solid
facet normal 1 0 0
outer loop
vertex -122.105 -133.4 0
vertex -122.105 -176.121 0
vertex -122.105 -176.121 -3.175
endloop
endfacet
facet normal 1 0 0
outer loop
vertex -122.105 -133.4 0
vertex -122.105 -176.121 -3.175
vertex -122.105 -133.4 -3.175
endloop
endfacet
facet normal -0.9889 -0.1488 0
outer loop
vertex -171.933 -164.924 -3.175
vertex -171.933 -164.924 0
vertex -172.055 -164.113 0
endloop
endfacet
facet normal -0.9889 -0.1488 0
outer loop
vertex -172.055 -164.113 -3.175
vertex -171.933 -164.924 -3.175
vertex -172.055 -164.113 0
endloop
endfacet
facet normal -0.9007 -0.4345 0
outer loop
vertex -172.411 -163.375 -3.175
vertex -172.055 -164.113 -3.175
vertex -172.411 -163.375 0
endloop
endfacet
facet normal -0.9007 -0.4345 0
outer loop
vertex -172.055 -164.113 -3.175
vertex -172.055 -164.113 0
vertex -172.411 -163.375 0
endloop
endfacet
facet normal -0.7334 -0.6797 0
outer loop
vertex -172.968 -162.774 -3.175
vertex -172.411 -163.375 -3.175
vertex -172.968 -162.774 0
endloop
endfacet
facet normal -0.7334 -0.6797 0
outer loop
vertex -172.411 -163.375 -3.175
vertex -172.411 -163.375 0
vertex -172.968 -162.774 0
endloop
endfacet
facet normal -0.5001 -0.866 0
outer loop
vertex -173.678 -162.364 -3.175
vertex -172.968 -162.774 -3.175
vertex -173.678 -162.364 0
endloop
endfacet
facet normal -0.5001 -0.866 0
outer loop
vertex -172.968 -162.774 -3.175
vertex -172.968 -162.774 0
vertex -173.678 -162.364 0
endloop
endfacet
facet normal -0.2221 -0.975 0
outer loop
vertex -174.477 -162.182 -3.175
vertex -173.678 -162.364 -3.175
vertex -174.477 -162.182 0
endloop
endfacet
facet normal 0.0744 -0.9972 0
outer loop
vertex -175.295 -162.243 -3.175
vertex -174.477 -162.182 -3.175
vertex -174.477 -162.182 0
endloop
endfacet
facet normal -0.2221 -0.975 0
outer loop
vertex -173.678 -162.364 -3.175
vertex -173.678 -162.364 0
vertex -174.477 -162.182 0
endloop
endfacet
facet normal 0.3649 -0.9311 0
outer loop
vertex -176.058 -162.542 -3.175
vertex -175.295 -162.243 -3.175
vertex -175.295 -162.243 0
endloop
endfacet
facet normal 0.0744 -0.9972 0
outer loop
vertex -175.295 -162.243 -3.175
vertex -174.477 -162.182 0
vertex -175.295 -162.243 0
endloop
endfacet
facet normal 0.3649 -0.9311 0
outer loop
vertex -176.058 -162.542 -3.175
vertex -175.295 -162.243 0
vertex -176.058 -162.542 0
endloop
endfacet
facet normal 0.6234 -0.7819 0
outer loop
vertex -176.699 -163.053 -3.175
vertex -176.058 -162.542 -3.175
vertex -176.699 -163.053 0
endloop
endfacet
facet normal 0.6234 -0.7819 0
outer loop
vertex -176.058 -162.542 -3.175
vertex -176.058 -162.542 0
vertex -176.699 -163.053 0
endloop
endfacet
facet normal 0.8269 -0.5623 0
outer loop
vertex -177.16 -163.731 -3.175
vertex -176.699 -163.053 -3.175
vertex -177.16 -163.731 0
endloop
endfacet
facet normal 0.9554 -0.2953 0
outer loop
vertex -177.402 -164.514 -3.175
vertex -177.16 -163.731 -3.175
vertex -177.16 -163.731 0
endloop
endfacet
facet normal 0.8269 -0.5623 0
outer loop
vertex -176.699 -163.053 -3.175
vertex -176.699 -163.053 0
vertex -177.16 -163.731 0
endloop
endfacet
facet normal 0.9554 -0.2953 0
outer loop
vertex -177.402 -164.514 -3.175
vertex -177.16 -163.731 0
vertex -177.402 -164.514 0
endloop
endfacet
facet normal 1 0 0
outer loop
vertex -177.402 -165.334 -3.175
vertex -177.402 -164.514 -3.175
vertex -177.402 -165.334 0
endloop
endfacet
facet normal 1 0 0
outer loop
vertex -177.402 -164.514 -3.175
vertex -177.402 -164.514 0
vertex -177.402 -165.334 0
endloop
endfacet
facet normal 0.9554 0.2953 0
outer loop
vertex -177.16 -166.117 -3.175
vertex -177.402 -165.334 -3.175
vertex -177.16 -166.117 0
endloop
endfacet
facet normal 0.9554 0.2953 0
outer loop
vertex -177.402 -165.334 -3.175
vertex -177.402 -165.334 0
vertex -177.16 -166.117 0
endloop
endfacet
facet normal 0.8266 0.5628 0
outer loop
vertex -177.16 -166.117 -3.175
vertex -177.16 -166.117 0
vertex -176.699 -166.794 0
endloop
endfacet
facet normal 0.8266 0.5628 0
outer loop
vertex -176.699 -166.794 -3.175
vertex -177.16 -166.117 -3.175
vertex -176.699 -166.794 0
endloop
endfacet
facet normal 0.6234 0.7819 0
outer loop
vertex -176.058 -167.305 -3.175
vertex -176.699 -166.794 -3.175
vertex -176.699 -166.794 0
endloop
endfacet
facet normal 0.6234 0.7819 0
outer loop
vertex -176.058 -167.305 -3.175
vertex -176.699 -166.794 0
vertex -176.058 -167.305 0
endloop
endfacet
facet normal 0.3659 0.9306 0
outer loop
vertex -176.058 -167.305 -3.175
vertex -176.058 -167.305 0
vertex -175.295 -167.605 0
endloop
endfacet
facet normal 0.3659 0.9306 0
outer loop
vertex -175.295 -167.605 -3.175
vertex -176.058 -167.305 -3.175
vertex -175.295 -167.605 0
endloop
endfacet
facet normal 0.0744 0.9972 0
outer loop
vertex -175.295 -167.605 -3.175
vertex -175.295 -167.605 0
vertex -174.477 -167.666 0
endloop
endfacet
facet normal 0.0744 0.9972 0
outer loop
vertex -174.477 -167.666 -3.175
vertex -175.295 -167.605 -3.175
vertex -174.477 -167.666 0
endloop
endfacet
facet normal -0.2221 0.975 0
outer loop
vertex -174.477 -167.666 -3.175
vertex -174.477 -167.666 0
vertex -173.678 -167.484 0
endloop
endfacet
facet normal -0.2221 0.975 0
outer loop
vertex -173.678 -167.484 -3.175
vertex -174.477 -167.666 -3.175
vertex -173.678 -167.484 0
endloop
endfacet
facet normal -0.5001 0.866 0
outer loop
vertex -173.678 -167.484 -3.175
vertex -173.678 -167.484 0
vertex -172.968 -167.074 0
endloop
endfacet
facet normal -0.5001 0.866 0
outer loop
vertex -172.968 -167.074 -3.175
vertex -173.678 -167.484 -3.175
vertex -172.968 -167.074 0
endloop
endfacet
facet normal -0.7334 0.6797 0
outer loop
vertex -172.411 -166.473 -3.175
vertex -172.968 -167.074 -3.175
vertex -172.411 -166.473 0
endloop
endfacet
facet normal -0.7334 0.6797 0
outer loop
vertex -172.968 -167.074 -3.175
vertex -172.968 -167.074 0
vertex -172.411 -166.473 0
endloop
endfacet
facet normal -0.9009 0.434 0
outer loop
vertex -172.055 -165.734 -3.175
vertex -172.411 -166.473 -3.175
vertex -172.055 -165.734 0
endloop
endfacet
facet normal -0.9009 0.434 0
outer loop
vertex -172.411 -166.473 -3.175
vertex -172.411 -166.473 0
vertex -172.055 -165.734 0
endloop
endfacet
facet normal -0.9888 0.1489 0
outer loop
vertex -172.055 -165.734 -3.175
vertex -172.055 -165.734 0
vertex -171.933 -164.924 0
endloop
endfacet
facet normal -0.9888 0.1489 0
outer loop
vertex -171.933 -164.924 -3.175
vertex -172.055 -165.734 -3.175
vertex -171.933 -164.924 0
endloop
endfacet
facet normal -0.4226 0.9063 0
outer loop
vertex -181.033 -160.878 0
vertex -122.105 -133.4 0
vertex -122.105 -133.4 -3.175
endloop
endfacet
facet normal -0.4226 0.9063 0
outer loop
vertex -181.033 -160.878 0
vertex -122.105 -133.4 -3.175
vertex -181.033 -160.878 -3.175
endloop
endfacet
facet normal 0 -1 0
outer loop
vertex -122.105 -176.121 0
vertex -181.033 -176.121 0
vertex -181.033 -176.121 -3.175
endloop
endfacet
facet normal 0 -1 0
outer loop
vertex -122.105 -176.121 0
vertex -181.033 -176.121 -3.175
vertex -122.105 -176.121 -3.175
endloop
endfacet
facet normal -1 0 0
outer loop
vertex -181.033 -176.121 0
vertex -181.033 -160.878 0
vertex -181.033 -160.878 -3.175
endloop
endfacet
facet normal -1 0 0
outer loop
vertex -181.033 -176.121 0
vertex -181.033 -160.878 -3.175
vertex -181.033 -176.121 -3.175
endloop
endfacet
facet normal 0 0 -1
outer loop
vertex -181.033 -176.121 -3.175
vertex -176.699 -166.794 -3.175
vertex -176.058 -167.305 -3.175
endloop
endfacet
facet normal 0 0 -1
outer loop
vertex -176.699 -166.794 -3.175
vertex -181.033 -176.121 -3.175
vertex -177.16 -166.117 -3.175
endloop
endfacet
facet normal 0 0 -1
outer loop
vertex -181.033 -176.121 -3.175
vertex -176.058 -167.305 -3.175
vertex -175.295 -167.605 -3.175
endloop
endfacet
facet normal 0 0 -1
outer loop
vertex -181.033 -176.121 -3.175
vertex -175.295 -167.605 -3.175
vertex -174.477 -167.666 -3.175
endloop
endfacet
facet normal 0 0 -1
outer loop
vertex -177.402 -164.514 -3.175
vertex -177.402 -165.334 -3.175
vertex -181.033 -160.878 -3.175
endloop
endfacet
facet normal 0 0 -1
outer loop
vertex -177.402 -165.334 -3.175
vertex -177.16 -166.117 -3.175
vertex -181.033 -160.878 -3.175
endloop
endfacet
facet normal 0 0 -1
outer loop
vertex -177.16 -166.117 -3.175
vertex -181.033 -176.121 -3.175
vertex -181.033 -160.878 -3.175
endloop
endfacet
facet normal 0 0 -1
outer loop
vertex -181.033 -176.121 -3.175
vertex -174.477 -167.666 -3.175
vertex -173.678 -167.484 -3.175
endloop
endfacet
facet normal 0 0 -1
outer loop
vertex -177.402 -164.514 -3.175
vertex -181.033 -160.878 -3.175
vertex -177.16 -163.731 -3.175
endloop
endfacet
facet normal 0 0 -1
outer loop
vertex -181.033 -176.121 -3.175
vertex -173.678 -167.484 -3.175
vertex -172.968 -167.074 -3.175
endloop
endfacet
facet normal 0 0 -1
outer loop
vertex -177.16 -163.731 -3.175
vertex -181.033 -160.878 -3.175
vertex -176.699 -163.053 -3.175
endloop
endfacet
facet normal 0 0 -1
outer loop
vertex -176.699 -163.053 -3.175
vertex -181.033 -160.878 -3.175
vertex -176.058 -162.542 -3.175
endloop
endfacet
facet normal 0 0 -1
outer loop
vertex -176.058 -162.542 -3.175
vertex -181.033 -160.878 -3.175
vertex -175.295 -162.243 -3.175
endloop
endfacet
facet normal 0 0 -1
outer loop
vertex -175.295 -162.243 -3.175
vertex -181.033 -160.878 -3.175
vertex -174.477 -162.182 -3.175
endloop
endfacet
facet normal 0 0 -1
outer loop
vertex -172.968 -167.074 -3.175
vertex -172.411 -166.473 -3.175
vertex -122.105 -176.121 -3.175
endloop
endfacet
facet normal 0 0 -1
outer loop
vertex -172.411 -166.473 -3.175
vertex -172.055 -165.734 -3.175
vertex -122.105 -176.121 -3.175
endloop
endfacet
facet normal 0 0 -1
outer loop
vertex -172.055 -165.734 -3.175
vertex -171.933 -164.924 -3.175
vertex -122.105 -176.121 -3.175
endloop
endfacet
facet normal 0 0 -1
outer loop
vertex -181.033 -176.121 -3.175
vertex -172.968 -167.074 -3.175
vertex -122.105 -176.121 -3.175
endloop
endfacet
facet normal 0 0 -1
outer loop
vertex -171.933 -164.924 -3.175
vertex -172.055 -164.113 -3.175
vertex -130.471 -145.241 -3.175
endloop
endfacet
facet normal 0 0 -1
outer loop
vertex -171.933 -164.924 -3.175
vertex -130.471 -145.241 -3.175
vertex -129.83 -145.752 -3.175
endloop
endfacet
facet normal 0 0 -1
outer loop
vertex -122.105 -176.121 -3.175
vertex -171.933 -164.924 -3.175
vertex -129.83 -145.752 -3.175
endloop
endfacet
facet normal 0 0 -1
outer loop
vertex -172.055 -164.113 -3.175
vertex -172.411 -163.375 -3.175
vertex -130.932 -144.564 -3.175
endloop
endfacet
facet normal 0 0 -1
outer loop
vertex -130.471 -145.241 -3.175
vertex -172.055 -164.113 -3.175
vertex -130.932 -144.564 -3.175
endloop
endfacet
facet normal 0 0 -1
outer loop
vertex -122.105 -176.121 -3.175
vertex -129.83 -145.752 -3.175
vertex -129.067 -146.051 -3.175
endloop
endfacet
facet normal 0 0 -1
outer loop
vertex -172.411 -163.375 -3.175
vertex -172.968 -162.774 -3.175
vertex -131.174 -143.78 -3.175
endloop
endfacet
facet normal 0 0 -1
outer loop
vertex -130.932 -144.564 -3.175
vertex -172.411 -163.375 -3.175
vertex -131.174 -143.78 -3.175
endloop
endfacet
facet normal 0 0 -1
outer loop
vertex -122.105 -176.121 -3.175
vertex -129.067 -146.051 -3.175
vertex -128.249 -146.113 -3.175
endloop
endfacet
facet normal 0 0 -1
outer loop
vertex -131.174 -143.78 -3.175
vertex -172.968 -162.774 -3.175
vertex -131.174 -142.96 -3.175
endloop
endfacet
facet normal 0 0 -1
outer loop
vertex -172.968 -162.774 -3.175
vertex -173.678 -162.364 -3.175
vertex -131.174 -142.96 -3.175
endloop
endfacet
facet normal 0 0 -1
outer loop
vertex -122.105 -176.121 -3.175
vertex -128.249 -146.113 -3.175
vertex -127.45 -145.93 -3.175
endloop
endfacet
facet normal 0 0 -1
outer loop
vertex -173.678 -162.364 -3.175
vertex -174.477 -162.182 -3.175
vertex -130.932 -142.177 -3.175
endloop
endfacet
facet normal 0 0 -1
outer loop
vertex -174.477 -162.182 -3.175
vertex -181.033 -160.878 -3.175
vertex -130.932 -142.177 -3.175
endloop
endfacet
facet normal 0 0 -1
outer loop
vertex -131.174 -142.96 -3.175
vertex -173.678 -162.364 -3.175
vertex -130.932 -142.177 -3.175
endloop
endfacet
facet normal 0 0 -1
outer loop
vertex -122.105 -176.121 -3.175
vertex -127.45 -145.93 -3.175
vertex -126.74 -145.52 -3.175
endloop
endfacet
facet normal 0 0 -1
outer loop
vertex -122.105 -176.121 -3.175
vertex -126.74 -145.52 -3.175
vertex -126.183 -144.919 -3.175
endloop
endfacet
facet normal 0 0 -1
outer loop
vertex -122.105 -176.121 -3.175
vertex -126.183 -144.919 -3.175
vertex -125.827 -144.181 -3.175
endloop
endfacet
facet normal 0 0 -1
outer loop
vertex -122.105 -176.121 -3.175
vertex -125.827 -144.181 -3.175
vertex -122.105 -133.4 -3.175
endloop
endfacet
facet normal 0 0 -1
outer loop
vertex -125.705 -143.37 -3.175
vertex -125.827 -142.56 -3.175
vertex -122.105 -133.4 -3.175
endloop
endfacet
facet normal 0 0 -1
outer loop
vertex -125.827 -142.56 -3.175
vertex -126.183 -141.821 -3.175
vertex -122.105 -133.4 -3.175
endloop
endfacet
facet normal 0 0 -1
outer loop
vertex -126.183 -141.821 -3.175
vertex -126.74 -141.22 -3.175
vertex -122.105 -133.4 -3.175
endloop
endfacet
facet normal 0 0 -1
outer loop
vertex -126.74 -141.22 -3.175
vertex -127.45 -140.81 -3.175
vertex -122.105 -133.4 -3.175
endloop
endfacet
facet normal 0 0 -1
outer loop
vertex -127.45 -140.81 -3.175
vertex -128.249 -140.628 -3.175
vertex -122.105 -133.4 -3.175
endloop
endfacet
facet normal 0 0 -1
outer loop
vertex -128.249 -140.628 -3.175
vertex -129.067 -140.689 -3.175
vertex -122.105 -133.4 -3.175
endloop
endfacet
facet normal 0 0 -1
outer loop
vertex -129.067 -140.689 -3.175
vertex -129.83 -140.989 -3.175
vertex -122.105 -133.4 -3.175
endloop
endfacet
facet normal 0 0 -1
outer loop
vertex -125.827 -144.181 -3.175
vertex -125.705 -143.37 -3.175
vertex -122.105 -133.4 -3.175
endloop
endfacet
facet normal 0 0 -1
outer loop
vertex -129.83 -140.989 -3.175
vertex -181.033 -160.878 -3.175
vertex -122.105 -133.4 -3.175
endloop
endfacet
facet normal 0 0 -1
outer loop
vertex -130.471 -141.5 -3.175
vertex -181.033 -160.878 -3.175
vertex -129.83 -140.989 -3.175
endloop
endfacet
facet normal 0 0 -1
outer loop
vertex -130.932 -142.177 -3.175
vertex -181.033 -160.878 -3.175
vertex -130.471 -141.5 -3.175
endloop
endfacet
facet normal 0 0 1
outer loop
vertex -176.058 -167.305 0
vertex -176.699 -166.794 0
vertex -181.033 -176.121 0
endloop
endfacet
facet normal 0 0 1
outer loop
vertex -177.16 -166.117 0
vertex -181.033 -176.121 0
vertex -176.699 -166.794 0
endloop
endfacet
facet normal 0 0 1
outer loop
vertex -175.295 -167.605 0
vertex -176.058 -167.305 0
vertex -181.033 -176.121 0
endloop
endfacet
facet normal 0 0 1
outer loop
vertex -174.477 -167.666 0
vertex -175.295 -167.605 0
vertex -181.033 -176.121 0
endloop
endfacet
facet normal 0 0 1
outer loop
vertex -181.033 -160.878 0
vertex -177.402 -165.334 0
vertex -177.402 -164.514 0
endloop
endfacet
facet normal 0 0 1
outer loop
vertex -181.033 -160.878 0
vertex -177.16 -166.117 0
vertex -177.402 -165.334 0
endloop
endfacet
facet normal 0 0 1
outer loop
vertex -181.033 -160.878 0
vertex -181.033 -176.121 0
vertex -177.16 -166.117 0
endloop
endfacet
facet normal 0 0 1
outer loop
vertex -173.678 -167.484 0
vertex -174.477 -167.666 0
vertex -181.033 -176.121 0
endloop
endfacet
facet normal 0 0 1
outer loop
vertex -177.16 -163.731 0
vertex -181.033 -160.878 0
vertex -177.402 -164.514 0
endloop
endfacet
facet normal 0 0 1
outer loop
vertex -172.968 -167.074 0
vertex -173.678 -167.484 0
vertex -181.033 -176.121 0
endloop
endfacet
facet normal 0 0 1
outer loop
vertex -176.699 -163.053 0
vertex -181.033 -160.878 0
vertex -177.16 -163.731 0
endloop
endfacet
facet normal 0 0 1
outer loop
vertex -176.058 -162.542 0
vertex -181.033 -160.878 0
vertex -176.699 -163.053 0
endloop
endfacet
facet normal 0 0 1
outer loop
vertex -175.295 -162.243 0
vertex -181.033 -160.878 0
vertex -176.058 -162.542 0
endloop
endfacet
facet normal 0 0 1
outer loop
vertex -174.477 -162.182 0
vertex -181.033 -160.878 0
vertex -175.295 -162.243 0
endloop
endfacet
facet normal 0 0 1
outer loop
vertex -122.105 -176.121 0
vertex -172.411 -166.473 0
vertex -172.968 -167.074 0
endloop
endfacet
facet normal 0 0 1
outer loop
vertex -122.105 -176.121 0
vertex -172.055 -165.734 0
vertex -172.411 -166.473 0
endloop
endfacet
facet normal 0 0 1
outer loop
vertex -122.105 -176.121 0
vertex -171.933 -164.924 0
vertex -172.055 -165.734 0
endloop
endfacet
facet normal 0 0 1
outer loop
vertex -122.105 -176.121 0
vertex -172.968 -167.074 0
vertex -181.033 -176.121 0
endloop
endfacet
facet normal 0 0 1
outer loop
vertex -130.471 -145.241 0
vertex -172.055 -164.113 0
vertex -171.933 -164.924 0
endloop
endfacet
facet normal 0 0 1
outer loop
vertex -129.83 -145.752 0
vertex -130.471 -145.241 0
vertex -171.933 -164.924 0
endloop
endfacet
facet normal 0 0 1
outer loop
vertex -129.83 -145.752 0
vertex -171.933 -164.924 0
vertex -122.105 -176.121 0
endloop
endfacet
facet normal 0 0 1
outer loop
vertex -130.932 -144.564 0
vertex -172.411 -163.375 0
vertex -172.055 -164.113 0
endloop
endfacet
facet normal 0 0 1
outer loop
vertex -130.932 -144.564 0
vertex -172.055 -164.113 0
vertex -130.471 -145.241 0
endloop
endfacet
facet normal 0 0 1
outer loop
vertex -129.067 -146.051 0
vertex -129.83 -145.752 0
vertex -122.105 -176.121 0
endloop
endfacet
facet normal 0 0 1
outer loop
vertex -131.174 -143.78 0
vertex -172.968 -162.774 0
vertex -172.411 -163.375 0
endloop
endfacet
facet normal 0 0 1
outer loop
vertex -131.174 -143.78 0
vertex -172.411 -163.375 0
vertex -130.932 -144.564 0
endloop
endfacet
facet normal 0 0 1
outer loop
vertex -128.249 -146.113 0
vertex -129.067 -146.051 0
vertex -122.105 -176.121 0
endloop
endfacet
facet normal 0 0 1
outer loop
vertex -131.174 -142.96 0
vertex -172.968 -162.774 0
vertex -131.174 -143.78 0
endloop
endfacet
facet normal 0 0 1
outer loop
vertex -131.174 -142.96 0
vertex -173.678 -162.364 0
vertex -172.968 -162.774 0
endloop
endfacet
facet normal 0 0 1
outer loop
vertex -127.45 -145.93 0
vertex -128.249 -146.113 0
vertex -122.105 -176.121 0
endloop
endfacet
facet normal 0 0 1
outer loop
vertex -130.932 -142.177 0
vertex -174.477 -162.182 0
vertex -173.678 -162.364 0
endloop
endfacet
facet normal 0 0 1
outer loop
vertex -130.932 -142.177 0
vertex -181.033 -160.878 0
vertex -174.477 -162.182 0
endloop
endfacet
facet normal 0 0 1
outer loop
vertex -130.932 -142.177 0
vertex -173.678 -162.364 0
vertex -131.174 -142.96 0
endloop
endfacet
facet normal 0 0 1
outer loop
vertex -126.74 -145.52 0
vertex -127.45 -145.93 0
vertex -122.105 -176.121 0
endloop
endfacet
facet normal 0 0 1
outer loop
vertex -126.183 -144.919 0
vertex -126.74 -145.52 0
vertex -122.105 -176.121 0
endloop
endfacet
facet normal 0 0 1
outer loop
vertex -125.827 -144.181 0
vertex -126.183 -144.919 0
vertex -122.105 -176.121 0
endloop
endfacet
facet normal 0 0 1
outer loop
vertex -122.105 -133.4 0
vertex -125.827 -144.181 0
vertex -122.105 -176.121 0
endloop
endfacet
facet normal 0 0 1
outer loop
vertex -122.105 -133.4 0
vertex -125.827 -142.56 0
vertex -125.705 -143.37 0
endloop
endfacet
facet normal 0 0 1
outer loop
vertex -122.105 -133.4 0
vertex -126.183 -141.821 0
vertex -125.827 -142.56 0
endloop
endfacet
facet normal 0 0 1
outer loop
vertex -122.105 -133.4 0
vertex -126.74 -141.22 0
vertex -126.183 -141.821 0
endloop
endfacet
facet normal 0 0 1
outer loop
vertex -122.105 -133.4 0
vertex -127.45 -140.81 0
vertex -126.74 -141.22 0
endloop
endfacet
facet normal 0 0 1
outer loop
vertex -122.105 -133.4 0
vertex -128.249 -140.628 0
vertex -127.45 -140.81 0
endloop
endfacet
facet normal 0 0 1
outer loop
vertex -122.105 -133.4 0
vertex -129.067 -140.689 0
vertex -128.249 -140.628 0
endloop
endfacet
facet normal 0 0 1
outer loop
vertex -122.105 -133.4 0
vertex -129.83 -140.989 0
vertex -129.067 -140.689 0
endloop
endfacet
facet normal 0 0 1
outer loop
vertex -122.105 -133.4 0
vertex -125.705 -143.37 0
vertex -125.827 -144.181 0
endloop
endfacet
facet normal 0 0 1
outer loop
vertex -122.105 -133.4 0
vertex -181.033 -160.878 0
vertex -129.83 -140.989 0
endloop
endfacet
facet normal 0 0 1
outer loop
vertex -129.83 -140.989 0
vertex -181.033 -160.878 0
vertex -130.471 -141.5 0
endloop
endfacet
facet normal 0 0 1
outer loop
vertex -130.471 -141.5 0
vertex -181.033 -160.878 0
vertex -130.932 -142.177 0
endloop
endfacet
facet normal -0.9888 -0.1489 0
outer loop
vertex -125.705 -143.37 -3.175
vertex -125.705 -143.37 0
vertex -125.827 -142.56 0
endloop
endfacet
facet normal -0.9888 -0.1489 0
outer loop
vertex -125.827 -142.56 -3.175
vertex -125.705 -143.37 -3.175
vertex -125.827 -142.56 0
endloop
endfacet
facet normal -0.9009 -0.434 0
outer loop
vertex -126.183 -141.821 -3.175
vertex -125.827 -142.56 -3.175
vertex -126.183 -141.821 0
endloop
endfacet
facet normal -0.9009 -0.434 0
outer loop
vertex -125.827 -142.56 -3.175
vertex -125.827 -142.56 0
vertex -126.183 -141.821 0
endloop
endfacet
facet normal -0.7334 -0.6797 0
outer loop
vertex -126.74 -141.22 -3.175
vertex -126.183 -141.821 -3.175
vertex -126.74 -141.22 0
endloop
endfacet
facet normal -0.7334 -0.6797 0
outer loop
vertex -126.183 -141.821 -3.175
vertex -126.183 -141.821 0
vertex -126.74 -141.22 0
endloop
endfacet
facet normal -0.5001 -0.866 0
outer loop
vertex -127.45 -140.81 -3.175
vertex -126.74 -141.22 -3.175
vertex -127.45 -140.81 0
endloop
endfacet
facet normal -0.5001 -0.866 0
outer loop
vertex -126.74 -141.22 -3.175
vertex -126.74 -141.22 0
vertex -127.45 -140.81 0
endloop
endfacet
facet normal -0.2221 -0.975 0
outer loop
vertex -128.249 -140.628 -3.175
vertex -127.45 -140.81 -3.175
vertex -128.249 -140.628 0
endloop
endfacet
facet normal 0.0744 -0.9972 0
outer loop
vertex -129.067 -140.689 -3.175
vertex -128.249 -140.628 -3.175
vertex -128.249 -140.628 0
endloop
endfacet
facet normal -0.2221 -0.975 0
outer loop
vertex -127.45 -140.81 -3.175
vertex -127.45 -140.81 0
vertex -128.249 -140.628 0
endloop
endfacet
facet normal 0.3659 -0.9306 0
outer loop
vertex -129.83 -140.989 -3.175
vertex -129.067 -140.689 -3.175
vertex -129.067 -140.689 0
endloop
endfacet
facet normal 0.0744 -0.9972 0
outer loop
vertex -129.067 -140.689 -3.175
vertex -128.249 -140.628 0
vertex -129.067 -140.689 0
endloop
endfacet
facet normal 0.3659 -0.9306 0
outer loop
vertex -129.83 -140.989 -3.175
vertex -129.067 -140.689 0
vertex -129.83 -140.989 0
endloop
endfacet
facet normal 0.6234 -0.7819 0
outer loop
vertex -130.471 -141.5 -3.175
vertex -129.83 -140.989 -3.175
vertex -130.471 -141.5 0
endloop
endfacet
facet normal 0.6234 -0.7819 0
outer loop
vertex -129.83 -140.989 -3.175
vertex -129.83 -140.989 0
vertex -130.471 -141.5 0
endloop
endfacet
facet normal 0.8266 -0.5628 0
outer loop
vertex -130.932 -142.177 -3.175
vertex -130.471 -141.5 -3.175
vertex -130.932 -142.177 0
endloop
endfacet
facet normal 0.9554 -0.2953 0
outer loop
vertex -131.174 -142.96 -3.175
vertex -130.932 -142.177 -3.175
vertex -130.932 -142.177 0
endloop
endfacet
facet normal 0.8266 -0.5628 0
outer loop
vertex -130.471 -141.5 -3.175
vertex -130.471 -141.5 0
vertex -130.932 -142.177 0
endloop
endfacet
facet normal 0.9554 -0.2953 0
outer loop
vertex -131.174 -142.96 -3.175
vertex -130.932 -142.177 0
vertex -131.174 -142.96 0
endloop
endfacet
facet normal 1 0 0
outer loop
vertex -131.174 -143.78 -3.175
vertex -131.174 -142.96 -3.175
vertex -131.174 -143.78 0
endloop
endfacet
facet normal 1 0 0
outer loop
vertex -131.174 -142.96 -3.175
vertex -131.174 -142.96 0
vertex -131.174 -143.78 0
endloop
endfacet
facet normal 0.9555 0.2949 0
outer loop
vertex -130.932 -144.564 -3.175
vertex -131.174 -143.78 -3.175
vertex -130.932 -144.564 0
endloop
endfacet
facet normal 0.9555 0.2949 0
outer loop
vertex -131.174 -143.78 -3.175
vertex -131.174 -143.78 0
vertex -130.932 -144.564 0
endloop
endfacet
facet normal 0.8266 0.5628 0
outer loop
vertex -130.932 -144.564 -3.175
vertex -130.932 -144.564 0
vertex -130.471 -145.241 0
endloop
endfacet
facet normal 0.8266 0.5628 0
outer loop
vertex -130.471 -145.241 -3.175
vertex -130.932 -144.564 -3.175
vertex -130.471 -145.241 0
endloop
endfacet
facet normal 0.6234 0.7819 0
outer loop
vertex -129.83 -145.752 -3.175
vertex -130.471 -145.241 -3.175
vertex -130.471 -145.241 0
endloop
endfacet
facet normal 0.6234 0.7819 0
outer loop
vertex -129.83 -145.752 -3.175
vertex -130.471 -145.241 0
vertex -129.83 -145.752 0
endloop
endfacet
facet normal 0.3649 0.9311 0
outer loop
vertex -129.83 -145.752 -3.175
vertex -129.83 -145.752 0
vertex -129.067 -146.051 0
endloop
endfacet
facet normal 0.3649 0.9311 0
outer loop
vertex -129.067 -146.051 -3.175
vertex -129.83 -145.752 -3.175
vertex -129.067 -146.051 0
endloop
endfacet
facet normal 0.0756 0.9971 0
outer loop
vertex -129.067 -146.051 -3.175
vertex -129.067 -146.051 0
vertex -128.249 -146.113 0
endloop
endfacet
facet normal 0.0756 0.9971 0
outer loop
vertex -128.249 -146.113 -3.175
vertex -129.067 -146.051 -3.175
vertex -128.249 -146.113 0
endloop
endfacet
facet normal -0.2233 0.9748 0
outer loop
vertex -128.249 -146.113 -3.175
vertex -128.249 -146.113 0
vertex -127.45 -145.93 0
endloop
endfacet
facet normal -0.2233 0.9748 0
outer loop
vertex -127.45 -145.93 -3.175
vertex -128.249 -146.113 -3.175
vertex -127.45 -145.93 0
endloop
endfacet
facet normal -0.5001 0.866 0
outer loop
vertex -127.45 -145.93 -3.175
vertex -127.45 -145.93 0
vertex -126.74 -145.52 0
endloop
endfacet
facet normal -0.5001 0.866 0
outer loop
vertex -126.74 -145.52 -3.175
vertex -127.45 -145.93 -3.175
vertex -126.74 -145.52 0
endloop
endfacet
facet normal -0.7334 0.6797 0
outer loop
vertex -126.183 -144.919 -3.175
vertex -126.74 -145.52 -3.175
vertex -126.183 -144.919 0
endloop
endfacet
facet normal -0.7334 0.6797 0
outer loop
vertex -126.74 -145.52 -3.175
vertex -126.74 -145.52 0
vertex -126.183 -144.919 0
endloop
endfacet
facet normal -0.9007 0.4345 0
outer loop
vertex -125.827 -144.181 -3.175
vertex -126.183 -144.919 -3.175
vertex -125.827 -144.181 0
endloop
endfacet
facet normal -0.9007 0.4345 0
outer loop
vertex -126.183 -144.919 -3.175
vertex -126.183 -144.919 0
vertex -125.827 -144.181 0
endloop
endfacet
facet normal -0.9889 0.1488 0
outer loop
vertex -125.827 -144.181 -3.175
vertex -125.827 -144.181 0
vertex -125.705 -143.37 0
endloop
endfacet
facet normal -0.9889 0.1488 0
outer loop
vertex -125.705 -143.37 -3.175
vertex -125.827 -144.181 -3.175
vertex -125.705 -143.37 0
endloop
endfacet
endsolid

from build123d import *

# Parameters (mm, degrees)
SKETCH1_R           = 2.75
BOSS_EXTRUDE1_DEPTH = 3.175


with BuildPart() as part:
    # Sketch1 → Boss-Extrude1 (new body)
    with BuildSketch(Plane.XY):
        Polygon((-122.104796952, -176.121133645), (-122.104796952, -133.399898637), (-181.032796952, -160.878476317), (-181.032796952, -176.121133645), align=None)
        with Locations((-174.682796952, -164.923872473)):
            Circle(SKETCH1_R, mode=Mode.SUBTRACT)
        with Locations((-128.454796952, -143.370341124)):
            Circle(SKETCH1_R, mode=Mode.SUBTRACT)
    extrude(amount=-BOSS_EXTRUDE1_DEPTH)


solid = part.part
